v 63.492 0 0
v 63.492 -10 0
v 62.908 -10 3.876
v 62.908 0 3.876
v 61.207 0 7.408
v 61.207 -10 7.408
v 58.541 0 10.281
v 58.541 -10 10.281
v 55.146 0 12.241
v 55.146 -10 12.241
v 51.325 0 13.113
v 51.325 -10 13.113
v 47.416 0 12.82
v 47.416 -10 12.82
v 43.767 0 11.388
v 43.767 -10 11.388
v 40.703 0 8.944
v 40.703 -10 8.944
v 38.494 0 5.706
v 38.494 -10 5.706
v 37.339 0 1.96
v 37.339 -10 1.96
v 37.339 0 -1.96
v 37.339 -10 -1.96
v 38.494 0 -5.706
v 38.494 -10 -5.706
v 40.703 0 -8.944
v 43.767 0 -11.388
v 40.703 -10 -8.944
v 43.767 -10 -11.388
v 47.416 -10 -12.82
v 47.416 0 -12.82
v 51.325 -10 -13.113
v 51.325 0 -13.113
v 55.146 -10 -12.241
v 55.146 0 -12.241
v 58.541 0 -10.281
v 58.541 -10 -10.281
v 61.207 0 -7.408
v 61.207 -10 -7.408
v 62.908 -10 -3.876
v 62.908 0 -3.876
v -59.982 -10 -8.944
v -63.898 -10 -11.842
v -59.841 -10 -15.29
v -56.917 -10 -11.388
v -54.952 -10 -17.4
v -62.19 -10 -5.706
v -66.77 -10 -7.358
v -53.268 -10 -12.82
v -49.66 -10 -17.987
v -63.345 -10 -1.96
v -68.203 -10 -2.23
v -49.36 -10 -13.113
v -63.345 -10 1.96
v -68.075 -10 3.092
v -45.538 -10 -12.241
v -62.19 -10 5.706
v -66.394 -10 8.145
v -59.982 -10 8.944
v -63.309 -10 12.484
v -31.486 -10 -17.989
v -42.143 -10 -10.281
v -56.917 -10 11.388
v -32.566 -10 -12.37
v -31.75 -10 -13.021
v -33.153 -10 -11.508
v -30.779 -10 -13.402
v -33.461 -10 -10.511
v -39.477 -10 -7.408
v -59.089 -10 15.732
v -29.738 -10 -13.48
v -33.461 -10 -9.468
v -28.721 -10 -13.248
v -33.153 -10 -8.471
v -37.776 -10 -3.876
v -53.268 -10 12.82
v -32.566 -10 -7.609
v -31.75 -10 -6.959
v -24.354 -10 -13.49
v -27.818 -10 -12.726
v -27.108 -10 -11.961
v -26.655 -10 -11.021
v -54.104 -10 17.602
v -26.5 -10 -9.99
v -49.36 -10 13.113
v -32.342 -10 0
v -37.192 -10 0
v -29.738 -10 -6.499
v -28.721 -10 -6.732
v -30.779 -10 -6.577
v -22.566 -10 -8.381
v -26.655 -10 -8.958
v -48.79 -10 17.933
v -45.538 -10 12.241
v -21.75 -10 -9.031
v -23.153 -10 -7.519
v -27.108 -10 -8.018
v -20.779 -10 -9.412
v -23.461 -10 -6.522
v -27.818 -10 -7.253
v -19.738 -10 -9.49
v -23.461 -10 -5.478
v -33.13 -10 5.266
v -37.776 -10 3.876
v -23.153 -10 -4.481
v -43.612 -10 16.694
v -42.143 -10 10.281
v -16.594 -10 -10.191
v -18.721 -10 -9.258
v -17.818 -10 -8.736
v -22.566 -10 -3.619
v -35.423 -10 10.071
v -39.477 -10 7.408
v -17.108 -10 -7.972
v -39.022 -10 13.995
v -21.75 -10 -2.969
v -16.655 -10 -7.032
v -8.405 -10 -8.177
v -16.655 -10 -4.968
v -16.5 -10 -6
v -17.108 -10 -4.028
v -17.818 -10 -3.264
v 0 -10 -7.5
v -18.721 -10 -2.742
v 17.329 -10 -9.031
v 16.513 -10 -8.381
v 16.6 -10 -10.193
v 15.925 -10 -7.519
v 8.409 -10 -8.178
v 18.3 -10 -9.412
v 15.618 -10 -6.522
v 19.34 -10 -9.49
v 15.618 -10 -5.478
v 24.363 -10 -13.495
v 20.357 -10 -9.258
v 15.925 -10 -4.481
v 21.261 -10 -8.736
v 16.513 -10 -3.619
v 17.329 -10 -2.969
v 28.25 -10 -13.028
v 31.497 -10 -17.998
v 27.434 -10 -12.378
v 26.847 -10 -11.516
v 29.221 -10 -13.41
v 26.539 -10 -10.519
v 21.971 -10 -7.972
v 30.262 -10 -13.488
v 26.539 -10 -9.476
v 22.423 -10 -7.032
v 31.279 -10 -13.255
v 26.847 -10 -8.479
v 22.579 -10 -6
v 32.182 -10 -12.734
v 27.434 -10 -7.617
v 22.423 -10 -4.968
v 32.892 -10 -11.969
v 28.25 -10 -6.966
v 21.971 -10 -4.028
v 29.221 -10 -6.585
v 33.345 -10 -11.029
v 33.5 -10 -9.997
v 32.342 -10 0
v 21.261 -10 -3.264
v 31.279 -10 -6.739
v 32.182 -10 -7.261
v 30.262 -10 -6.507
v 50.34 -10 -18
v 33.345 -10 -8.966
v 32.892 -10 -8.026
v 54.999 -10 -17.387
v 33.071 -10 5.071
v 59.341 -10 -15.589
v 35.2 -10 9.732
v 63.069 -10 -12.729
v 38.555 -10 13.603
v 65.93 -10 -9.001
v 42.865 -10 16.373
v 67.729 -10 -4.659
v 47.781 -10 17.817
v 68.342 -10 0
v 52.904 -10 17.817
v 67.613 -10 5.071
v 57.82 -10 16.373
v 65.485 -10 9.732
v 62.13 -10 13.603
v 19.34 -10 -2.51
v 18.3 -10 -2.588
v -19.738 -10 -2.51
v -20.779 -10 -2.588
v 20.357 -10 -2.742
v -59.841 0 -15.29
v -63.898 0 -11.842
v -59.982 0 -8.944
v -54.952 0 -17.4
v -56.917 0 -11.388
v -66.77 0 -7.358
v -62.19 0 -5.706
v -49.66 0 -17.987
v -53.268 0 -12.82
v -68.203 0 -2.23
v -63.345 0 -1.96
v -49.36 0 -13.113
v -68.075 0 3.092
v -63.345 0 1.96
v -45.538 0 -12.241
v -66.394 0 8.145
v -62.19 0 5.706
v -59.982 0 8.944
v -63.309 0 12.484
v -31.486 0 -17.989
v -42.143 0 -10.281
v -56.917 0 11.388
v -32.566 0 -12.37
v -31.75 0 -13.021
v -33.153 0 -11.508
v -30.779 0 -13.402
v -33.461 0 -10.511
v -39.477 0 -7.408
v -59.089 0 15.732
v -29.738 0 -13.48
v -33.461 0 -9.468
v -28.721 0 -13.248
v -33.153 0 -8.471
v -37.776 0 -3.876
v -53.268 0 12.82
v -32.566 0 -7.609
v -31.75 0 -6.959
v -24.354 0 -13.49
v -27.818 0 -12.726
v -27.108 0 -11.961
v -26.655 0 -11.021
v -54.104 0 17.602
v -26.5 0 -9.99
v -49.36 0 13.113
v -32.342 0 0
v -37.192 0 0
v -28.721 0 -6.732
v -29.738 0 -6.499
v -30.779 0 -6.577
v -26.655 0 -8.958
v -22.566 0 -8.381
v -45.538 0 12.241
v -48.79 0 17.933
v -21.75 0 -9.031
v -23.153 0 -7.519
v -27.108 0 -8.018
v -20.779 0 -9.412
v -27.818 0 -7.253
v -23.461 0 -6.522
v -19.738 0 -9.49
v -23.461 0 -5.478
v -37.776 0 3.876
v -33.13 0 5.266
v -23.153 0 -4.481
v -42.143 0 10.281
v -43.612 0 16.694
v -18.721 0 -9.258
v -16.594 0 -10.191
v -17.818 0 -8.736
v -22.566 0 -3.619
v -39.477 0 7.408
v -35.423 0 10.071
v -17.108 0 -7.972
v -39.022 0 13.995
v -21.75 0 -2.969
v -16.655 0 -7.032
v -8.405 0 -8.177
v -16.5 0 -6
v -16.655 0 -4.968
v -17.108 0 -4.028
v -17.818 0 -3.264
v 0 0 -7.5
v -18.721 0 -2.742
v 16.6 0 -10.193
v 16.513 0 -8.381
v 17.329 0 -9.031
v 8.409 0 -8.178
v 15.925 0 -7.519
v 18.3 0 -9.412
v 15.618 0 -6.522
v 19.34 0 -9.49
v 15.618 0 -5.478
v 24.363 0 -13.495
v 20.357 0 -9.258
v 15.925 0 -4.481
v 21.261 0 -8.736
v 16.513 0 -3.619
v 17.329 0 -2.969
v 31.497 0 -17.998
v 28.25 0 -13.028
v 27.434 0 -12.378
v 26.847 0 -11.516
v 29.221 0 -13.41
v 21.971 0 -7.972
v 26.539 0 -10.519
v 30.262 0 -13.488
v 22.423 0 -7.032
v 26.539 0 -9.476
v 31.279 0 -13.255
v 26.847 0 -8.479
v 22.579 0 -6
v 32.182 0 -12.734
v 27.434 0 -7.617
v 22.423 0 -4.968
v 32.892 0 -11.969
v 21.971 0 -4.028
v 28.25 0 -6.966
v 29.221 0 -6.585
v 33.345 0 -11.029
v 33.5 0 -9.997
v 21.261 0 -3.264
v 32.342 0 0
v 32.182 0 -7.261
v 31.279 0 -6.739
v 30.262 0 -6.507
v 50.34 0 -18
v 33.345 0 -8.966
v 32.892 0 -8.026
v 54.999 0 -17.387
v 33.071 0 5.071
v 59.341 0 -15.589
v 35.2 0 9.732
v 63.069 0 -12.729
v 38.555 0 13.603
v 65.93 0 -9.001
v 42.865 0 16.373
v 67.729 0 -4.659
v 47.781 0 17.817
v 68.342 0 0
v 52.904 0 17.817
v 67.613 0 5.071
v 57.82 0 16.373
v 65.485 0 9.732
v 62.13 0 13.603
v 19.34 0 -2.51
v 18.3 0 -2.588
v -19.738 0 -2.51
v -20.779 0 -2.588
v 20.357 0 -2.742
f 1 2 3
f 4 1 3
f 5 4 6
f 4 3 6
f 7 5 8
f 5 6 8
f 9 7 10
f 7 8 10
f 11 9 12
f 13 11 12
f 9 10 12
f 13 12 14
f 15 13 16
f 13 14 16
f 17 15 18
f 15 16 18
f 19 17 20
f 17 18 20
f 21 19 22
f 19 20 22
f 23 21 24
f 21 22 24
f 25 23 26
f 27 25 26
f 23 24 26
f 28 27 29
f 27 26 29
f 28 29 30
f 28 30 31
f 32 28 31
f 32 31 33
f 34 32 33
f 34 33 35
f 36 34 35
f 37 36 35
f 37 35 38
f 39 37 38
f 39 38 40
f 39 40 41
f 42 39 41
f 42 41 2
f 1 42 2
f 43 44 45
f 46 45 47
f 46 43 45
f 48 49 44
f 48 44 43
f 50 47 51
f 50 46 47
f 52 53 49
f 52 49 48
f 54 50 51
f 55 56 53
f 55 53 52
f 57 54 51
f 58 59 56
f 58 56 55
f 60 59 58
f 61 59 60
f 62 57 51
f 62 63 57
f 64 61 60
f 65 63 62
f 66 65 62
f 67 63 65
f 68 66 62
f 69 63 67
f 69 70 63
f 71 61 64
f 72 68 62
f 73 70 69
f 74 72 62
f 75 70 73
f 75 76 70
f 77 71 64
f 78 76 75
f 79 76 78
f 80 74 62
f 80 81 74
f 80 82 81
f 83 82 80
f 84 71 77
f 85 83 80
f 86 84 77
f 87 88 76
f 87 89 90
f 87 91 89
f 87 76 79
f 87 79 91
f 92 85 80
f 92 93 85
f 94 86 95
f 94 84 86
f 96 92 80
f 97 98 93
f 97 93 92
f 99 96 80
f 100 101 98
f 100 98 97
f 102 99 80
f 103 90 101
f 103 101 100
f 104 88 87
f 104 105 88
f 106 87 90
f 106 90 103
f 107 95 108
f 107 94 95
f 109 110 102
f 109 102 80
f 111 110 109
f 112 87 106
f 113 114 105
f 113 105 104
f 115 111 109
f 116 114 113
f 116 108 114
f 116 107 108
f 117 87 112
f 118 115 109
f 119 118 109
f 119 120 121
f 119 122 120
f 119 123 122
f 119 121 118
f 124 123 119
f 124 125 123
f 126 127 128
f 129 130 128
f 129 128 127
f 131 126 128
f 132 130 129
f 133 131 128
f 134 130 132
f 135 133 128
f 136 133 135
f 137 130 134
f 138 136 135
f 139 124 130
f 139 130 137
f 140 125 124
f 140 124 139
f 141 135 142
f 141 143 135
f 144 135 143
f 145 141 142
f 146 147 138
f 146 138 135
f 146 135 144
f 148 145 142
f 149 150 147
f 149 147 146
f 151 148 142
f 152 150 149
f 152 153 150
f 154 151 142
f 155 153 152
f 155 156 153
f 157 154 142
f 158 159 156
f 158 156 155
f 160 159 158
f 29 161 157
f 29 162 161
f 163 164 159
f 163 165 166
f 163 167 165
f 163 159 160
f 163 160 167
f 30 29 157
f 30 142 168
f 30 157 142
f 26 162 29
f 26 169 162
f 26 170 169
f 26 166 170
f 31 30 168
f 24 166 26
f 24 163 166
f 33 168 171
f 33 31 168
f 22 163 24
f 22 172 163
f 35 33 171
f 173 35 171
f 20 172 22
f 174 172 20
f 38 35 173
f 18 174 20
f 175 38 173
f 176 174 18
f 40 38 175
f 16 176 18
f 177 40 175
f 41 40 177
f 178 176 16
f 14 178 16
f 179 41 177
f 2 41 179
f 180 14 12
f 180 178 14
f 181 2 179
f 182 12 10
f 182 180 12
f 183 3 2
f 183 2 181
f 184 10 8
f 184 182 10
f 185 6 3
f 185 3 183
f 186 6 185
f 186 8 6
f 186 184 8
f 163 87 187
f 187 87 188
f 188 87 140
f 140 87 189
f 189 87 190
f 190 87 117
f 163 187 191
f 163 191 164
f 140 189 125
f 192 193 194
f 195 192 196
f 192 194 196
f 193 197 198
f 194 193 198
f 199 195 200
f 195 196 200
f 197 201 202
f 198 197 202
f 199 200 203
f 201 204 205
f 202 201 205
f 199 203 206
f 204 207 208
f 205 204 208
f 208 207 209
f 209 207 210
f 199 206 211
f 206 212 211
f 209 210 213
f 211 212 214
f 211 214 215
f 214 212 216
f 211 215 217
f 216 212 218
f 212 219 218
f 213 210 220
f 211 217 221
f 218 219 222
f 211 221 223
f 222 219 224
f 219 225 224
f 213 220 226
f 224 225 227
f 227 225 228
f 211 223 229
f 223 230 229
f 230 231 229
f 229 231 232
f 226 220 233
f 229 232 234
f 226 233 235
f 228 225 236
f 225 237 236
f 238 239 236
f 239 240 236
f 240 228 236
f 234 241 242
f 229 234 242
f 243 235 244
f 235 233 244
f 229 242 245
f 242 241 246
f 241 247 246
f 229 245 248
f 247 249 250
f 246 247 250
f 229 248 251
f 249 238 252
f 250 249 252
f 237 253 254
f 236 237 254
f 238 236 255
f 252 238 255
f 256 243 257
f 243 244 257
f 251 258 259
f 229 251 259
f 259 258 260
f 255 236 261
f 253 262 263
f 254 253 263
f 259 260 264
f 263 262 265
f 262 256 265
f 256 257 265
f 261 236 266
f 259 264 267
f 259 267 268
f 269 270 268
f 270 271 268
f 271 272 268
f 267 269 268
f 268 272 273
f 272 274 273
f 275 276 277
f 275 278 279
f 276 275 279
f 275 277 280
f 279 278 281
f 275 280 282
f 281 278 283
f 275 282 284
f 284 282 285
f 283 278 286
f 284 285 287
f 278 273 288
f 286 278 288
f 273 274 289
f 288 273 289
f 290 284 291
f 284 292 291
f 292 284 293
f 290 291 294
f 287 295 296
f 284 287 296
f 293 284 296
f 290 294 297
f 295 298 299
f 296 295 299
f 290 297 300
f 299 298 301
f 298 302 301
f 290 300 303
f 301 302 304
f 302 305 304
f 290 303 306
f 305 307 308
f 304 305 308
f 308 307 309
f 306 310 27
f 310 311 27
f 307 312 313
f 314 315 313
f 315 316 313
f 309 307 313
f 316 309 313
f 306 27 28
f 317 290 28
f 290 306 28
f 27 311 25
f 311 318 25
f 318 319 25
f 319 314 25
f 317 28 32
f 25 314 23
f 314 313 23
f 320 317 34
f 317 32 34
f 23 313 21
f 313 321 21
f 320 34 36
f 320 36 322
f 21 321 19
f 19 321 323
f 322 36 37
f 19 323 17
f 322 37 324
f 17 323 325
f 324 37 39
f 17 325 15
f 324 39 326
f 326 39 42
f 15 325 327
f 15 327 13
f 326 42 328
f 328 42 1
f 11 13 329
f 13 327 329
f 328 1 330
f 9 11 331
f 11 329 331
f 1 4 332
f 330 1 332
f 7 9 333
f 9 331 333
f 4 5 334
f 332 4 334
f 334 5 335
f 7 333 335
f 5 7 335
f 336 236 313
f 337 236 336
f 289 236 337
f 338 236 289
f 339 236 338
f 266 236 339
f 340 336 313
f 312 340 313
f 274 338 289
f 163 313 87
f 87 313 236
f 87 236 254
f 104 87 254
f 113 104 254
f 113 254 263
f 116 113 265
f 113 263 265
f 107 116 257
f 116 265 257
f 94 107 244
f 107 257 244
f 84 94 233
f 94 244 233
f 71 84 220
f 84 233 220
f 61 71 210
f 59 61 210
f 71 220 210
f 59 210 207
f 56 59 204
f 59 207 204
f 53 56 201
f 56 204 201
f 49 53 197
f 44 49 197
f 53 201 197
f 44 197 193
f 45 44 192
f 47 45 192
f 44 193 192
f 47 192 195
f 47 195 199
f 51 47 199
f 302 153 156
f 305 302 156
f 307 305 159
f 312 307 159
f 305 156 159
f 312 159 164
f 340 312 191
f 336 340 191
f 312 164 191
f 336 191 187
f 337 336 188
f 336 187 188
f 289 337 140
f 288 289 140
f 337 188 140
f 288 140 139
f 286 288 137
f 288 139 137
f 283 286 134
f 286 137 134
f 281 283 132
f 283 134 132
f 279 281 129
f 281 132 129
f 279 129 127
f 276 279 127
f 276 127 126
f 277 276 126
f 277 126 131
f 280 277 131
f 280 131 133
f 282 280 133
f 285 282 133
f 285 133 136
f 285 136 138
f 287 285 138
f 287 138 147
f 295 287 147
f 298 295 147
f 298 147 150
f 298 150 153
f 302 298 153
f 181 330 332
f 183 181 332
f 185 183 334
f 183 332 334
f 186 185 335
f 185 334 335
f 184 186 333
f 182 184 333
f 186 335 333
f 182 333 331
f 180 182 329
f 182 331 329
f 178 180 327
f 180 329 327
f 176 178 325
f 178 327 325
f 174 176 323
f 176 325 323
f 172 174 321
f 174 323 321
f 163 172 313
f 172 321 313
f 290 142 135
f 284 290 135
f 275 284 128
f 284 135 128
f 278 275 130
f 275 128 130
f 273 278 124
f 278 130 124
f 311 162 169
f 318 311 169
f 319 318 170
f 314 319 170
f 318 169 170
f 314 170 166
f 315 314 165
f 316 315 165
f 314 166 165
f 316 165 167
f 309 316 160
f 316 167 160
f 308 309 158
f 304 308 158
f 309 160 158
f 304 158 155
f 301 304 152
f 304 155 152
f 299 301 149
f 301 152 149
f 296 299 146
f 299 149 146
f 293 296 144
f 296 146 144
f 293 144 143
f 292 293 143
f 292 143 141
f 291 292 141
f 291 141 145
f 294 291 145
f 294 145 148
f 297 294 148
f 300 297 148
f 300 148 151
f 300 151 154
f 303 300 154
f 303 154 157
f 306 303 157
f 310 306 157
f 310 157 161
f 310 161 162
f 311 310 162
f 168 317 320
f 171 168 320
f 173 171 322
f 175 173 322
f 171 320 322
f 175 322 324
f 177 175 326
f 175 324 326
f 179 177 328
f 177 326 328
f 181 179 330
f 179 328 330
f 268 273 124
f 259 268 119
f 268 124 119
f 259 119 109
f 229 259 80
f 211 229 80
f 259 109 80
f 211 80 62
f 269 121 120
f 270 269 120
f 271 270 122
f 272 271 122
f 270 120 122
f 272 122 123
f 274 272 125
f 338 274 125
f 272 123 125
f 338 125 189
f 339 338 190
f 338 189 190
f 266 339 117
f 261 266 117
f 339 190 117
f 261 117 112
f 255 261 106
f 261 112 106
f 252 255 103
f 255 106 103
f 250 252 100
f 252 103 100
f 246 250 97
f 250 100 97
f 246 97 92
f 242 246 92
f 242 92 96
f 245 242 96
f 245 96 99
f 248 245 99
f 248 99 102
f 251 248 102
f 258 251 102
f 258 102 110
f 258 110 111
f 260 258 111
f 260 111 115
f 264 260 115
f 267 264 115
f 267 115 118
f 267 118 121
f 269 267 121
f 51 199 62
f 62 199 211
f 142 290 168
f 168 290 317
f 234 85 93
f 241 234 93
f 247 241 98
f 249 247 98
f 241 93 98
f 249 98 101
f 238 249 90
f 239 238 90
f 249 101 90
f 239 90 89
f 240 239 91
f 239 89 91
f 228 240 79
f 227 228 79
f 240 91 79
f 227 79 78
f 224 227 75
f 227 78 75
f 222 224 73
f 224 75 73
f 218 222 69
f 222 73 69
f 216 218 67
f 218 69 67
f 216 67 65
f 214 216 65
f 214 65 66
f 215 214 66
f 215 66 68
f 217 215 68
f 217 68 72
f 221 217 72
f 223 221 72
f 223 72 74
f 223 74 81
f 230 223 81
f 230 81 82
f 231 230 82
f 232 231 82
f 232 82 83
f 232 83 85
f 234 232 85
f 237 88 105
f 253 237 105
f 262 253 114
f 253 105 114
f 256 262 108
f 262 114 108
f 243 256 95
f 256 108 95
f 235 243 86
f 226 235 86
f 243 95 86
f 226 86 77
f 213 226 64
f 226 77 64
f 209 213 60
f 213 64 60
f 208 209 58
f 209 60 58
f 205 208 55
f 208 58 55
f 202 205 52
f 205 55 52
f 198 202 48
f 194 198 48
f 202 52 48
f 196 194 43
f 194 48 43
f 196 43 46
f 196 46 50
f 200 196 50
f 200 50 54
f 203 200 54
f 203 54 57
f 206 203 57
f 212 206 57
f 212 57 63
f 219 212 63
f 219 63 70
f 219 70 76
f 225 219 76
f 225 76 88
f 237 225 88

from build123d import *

# Parameters (mm, degrees)
F1_DEPTH = 10
F2_R     = 13.15
F3_DEPTH = 25
F5_DEPTH = 10.001
F6_R     = 3.5
F7_DEPTH = 10.001


with BuildPart() as f1:
    # F0 (on Front) → F1 (new body)
    with BuildSketch(Plane.XZ):
        with BuildLine():
            ThreePointArc((-49.6601038214, -17.9870707453), (-37.3753775975, -12.4844275463), (-32.3422225816, 0))
            ThreePointArc((-32.3422225816, 0), (-63.3090675656, 12.4844275463), (-49.6601038214, -17.9870707453))
        make_face()
        with BuildLine():
            Line((32.3422225816, 0), (-32.3422225816, 0))
            ThreePointArc((-32.3422225816, 0), (-37.3753775975, -12.4844275463), (-49.6601038214, -17.9870707453))
            Line((-49.6601038214, -17.9870707453), (50.3398953428, -17.9999998496))
            ThreePointArc((50.3398953428, -17.9999998496), (37.6134777436, -12.7270992316), (32.3422225816, 0))
        make_face()
        with BuildLine():
            ThreePointArc((68.3422225816, 0), (50.3422225816, 18), (32.3422225816, 0))
            ThreePointArc((32.3422225816, 0), (37.6134777436, -12.7270992316), (50.3398953428, -17.9999998496))
            ThreePointArc((50.3398953428, -17.9999998496), (63.0693218132, -12.7287448379), (68.3422225816, 0))
        make_face()
    extrude(amount=F1_DEPTH)

    # F2 (on face) → F3 (cut)
    with BuildSketch(Plane.XZ.offset(10)):
        with Locations((-50.3422225816, 0)):
            Circle(F2_R)
        with Locations((50.3422225816, 0)):
            Circle(F2_R)
    extrude(amount=-F3_DEPTH, mode=Mode.SUBTRACT)

    # F4 (on face) → F5 (cut, through all)
    with BuildSketch(Plane.XZ.offset(10)):
        with BuildLine():
            ThreePointArc((31.4967512046, -17.9975635998), (16.6000314606, -10.1934848087), (0, -7.5))
            Line((0, -7.5), (0, -17.993491352))
            Line((0, -17.993491352), (31.4967512046, -17.9975635998))
        make_face()
        with BuildLine():
            Line((0, -17.993491352), (0, -7.5))
            ThreePointArc((0, -7.5), (-16.5935917856, -10.1913389896), (-31.4858890741, -17.9894205085))
            Line((-31.4858890741, -17.9894205085), (0, -17.993491352))
        make_face()
    extrude(amount=-F5_DEPTH, mode=Mode.SUBTRACT)

    # F6 (on face) → F7 (cut, through all)
    with BuildSketch(Plane.XZ.offset(10)):
        with Locations((-30, -9.9896125538)):
            Circle(F6_R)
        with Locations((-20, -6)):
            Circle(F6_R)
        with Locations((19.0787840283, -6)):
            Circle(F6_R)
        with Locations((30, -9.9973700164)):
            Circle(F6_R)
    extrude(amount=-F7_DEPTH, mode=Mode.SUBTRACT)


solid = f1.part
